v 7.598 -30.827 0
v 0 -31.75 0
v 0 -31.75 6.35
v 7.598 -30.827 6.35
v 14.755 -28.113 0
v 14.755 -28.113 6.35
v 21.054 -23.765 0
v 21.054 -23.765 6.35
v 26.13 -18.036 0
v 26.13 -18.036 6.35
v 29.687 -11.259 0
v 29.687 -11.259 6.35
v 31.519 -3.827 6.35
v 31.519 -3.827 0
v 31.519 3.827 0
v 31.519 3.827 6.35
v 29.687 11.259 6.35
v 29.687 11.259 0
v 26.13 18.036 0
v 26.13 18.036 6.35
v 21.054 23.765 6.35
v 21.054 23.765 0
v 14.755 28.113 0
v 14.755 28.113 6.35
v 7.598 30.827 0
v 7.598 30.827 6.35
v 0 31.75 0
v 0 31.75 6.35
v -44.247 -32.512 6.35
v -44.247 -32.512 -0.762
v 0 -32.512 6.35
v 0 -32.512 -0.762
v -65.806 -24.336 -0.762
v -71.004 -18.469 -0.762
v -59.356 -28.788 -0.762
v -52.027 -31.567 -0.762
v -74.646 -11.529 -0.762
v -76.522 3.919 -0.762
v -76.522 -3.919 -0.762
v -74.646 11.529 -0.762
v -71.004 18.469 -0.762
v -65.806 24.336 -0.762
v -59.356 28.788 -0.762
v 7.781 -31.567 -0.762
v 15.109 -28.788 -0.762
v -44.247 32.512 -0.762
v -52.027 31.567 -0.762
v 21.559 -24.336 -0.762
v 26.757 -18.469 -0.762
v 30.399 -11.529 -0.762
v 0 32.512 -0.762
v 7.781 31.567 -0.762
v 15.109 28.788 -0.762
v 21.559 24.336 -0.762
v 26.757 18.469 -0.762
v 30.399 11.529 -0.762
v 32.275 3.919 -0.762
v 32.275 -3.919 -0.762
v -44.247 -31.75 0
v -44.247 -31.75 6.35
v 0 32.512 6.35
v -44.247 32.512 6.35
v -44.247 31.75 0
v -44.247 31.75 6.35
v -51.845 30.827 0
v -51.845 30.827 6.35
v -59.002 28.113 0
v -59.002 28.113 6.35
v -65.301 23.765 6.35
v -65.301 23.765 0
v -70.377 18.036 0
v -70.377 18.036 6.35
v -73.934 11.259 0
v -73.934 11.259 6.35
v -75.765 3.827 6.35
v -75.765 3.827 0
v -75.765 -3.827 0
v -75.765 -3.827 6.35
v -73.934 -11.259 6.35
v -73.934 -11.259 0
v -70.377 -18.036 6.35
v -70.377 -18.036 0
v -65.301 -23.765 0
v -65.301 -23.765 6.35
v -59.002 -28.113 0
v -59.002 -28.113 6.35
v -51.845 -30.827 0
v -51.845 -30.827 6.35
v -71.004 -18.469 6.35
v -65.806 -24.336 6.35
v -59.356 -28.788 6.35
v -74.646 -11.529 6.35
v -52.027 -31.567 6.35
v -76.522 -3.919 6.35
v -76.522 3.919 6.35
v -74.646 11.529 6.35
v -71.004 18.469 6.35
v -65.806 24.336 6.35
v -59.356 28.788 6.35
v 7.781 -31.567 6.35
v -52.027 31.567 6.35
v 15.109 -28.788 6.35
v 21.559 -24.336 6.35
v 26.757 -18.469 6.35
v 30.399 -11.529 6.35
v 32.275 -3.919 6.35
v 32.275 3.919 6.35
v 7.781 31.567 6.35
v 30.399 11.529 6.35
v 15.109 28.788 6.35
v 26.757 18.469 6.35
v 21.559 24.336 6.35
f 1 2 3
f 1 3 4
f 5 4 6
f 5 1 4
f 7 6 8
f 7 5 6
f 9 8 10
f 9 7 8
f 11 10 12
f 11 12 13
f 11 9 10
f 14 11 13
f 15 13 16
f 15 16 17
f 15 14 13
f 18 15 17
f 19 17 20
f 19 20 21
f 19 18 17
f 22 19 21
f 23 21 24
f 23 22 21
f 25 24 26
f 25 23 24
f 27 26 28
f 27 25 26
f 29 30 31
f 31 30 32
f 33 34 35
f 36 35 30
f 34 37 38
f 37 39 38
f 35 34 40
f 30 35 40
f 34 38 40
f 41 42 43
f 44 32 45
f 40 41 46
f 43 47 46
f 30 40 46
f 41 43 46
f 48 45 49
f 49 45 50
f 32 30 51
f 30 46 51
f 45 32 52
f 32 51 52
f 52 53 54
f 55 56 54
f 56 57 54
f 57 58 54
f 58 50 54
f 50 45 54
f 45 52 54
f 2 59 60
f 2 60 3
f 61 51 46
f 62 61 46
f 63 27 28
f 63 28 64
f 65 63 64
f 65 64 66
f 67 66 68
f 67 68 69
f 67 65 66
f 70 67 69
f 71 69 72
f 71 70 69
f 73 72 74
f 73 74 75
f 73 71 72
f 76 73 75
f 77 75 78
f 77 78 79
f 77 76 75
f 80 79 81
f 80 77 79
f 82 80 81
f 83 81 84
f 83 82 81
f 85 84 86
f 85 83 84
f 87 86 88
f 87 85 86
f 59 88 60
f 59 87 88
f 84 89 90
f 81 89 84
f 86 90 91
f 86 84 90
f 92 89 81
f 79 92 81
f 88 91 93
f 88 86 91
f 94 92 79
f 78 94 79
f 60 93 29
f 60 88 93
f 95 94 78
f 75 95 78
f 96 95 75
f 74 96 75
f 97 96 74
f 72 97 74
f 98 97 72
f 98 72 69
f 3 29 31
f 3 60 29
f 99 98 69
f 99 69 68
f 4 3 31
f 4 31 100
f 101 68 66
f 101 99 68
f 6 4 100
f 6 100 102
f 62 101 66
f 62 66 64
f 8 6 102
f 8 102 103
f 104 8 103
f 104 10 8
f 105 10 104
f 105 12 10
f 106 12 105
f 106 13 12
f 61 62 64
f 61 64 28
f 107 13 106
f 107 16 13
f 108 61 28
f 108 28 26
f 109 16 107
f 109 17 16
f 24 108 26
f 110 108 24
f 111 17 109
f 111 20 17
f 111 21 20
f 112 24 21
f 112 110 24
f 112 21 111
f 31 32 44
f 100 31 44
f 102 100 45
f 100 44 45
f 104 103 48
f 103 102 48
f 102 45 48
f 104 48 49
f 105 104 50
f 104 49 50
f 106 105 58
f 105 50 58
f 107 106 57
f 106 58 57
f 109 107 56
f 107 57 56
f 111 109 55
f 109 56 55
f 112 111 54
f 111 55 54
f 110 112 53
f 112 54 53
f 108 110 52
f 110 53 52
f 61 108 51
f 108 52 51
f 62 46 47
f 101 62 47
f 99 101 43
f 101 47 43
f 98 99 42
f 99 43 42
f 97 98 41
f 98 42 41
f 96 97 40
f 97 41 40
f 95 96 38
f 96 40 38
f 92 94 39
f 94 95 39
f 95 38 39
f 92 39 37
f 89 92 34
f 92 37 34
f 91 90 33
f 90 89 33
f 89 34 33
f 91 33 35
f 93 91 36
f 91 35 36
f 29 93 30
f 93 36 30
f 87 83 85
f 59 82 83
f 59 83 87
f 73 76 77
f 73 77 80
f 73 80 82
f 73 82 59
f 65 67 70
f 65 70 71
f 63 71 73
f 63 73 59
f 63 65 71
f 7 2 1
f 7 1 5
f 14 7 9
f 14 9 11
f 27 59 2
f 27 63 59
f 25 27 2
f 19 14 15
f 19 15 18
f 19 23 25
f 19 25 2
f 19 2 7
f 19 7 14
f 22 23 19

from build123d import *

# Parameters (mm, degrees)
F1_DEPTH = 6.35
F2_T     = 0.762


with BuildPart() as f1:
    # F0 (on Top) → F1 (new body)
    with BuildSketch(Plane.XY):
        with BuildLine():
            Line((-44.2468, -31.75), (0, -31.75))
            ThreePointArc((0, -31.75), (31.75, 0), (0, 31.75))
            Line((0, 31.75), (-44.2468, 31.75))
            ThreePointArc((-44.2468, 31.75), (-75.9968, 0), (-44.2468, -31.75))
        make_face()
    extrude(amount=F1_DEPTH)

    # F2
    f2_openings = [f1.faces().sort_by_distance(p)[0] for p in [
        (-22.1234, 0, 6.35),
    ]]
    offset(amount=F2_T, openings=f2_openings, kind=Kind.INTERSECTION)


solid = f1.part
